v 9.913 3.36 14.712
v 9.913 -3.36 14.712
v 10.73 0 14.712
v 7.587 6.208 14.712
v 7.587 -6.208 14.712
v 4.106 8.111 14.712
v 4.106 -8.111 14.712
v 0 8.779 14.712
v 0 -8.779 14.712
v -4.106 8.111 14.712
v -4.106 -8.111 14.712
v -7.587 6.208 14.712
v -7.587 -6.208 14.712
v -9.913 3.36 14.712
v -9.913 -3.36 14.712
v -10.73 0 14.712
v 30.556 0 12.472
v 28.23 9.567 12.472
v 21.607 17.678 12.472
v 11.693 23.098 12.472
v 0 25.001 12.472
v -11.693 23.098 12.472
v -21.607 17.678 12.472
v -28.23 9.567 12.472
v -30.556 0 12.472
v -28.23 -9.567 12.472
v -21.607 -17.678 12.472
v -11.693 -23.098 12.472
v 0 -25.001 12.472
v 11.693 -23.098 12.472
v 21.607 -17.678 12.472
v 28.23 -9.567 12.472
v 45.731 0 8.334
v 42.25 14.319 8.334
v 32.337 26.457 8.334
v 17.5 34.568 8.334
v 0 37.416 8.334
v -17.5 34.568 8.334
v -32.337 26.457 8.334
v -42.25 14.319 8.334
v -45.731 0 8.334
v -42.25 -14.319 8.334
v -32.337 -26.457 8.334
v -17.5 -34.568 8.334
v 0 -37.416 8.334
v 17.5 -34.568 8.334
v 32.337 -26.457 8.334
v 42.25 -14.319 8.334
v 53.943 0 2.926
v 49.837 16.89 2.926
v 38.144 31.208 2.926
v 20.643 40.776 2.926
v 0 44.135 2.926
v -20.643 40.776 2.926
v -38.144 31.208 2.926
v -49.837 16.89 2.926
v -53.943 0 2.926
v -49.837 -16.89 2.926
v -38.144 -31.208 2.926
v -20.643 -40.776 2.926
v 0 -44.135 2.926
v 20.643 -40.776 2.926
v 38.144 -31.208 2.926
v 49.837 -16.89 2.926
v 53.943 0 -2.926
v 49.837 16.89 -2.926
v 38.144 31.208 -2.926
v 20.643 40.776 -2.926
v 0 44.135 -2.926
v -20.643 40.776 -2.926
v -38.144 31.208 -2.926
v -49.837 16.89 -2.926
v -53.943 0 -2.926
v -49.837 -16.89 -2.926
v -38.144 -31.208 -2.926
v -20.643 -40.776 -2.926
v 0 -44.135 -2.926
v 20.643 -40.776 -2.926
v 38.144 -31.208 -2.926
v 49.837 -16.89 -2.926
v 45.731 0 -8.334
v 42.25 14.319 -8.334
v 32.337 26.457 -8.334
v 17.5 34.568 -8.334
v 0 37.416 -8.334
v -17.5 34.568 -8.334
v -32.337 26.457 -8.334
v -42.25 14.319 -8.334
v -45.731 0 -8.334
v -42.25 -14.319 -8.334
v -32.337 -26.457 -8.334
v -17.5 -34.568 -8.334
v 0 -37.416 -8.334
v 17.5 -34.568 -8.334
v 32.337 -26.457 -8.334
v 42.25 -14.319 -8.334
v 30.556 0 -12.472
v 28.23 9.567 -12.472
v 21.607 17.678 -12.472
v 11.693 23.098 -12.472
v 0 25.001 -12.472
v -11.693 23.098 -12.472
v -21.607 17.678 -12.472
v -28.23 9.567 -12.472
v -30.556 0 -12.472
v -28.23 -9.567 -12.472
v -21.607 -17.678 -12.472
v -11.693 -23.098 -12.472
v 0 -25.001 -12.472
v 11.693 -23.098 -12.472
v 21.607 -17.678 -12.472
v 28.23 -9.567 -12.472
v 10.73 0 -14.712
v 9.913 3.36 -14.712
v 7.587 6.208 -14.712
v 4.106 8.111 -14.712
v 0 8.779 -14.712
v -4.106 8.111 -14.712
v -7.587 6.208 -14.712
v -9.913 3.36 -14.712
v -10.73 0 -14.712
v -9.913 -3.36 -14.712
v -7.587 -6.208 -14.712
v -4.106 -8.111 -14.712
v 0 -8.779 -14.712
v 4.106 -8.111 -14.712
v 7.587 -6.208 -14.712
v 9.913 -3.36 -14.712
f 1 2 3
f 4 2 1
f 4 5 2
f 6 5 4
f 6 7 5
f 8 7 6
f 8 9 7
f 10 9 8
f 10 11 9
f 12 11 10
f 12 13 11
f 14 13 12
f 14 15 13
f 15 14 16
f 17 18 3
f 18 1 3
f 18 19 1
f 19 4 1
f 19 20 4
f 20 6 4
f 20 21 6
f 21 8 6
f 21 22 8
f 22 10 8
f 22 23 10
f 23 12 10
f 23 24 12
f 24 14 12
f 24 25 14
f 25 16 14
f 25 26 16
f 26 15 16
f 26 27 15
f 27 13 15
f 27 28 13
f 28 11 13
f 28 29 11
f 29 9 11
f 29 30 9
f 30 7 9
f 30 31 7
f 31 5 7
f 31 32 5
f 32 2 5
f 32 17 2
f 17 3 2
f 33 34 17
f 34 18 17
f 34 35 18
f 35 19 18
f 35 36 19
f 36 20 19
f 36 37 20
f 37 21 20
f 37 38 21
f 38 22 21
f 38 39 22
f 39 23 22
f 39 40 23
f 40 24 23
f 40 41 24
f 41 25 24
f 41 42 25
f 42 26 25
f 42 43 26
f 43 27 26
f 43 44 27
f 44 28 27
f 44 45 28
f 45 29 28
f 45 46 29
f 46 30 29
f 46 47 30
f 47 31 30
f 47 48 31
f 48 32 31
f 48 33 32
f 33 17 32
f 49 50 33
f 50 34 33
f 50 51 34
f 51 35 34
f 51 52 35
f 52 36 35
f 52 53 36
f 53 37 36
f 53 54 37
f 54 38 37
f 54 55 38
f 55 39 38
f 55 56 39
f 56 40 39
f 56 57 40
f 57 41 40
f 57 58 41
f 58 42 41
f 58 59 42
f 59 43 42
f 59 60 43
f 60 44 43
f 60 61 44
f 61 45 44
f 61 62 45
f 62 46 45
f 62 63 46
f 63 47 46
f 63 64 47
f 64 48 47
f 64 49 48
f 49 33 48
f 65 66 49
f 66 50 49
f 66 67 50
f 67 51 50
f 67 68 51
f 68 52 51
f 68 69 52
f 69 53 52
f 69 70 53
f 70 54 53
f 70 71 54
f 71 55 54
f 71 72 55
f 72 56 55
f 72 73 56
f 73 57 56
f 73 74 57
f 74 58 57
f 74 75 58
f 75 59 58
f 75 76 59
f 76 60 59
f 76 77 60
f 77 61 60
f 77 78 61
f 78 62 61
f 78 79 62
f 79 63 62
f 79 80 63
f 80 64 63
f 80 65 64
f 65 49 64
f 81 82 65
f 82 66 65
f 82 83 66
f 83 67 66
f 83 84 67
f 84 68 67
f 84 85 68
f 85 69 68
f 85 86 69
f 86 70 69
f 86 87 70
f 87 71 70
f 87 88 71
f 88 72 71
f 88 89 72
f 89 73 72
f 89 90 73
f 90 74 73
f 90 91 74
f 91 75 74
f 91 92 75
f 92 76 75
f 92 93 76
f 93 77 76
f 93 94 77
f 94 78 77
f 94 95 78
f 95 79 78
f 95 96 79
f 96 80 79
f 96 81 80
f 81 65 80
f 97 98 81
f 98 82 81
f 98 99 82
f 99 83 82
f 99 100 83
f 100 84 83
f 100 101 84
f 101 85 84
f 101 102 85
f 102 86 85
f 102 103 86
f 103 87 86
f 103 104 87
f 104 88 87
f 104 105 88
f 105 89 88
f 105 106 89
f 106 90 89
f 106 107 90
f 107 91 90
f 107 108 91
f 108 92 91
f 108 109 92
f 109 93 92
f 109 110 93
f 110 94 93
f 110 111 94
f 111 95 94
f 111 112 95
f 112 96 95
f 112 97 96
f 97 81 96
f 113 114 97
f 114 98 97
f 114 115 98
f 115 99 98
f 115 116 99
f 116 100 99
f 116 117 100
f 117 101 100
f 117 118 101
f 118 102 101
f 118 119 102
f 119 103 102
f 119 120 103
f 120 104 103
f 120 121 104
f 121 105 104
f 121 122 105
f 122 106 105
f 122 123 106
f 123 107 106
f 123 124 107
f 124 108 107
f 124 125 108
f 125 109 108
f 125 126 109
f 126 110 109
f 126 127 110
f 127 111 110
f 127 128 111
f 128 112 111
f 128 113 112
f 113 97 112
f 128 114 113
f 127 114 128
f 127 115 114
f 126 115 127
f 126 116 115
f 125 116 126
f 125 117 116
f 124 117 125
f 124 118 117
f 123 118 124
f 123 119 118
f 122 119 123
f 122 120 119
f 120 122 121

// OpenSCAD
// Generated by SolidPython 1.0.1 on 2020-07-29 00:46:49


scale(v = [11, 9, 3]) {
	sphere(r = 5);
}
/***********************************************
*********      SolidPython code:      **********
************************************************
 
# import packages: SolidPython
from solid import *
from solid.utils import *
from itertools import chain, combinations, permutations


class Resize:

    def __init__(self, scad_file):
        self.scad_file = scad_file
        #self.scad_file = import_scad(scad_file)
        # cone/cylinder param:
        self.r1 = 0
        self.r2 = 0
        self.h = 0
        # rectangular prism param:
        self.w = 0
        self.l = 0
        # ellipse param:
        self.r = 0

    # import OpenScad code (file name corresponds to shape)


    # classify shape + parameters
    def assign(self, param1, param2, param3):
        if self.scad_file == 'cone.scad':
            self.r1 = param1
            self.r2 = param2
            self.h = param3
        elif self.scad_file == 'cylinder.scad':
            self.r1 = param1
            self.r2 = param2
            self.h = param3
        elif self.scad_file == 'rectangularPrism.scad':
            self.h = param1
            self.l = param2
            self.w = param3
        else:
            self.r = param1
            self.h = param2

    # resize parameters
    def iterate(self):
        x = range(3, 20, 2)
        i = 1
        if self.scad_file == 'cone.scad':
            tempList = list(permutations(x, 2))
            for temp in tempList:
                param1 = temp[0]
                param2 = temp[1]
                filepath = 'produced_scad_files/' + 'cone' + str(param1) + '_' + str(param2) + '_' + '.scad'
                scad_render_to_file(cylinder(h=param1, r1=param2, r2=0), filepath)

        elif self.scad_file == 'cylinder.scad':
            tempList = list(permutations(x, 3))
            for temp in tempList:
                param1 = temp[0]
                param2 = temp[1]
                filepath = 'produced_scad_files/' + 'cylinder' + str(param1) + '_' + str(param2) + '_' + '.scad'
                scad_render_to_file(cylinder(h=param1, r1=param2, r2=param2), filepath)

        elif self.scad_file == 'rectangularPrism.scad':
            tempList = list(permutations(x, 3))
            for temp in tempList:
                param1 = temp[0]
                param2 = temp[1]
                param3 = temp[2]
                filepath = 'produced_scad_files/' + 'rectangularPrism' + str(param1) + '_' + str(param2) + '_' + str(
                    param3) + '.scad'
                scad_render_to_file(cube(size=(param1, param2, param3)), filepath)

        elif self.scad_file == 'ellipse.scad':
            tempList = list(permutations(x, 4))
            for temp in tempList:
                param1 = temp[0]
                param2 = temp[1]
                param3 = temp[2]
                param4 = temp[3]
                filepath = 'produced_scad_files/' + 'ellipse' + str(param1) + '_' + str(param2) + '_' + str(param3) + '_' + str(param4) + '.scad'
                scad_render_to_file(scale([param1, param2, param3])(sphere(r=param4)), filepath)

    def render_to_scadfile(self):
        scad_render_to_file(scad, 'example.scad') 
 
************************************************/
